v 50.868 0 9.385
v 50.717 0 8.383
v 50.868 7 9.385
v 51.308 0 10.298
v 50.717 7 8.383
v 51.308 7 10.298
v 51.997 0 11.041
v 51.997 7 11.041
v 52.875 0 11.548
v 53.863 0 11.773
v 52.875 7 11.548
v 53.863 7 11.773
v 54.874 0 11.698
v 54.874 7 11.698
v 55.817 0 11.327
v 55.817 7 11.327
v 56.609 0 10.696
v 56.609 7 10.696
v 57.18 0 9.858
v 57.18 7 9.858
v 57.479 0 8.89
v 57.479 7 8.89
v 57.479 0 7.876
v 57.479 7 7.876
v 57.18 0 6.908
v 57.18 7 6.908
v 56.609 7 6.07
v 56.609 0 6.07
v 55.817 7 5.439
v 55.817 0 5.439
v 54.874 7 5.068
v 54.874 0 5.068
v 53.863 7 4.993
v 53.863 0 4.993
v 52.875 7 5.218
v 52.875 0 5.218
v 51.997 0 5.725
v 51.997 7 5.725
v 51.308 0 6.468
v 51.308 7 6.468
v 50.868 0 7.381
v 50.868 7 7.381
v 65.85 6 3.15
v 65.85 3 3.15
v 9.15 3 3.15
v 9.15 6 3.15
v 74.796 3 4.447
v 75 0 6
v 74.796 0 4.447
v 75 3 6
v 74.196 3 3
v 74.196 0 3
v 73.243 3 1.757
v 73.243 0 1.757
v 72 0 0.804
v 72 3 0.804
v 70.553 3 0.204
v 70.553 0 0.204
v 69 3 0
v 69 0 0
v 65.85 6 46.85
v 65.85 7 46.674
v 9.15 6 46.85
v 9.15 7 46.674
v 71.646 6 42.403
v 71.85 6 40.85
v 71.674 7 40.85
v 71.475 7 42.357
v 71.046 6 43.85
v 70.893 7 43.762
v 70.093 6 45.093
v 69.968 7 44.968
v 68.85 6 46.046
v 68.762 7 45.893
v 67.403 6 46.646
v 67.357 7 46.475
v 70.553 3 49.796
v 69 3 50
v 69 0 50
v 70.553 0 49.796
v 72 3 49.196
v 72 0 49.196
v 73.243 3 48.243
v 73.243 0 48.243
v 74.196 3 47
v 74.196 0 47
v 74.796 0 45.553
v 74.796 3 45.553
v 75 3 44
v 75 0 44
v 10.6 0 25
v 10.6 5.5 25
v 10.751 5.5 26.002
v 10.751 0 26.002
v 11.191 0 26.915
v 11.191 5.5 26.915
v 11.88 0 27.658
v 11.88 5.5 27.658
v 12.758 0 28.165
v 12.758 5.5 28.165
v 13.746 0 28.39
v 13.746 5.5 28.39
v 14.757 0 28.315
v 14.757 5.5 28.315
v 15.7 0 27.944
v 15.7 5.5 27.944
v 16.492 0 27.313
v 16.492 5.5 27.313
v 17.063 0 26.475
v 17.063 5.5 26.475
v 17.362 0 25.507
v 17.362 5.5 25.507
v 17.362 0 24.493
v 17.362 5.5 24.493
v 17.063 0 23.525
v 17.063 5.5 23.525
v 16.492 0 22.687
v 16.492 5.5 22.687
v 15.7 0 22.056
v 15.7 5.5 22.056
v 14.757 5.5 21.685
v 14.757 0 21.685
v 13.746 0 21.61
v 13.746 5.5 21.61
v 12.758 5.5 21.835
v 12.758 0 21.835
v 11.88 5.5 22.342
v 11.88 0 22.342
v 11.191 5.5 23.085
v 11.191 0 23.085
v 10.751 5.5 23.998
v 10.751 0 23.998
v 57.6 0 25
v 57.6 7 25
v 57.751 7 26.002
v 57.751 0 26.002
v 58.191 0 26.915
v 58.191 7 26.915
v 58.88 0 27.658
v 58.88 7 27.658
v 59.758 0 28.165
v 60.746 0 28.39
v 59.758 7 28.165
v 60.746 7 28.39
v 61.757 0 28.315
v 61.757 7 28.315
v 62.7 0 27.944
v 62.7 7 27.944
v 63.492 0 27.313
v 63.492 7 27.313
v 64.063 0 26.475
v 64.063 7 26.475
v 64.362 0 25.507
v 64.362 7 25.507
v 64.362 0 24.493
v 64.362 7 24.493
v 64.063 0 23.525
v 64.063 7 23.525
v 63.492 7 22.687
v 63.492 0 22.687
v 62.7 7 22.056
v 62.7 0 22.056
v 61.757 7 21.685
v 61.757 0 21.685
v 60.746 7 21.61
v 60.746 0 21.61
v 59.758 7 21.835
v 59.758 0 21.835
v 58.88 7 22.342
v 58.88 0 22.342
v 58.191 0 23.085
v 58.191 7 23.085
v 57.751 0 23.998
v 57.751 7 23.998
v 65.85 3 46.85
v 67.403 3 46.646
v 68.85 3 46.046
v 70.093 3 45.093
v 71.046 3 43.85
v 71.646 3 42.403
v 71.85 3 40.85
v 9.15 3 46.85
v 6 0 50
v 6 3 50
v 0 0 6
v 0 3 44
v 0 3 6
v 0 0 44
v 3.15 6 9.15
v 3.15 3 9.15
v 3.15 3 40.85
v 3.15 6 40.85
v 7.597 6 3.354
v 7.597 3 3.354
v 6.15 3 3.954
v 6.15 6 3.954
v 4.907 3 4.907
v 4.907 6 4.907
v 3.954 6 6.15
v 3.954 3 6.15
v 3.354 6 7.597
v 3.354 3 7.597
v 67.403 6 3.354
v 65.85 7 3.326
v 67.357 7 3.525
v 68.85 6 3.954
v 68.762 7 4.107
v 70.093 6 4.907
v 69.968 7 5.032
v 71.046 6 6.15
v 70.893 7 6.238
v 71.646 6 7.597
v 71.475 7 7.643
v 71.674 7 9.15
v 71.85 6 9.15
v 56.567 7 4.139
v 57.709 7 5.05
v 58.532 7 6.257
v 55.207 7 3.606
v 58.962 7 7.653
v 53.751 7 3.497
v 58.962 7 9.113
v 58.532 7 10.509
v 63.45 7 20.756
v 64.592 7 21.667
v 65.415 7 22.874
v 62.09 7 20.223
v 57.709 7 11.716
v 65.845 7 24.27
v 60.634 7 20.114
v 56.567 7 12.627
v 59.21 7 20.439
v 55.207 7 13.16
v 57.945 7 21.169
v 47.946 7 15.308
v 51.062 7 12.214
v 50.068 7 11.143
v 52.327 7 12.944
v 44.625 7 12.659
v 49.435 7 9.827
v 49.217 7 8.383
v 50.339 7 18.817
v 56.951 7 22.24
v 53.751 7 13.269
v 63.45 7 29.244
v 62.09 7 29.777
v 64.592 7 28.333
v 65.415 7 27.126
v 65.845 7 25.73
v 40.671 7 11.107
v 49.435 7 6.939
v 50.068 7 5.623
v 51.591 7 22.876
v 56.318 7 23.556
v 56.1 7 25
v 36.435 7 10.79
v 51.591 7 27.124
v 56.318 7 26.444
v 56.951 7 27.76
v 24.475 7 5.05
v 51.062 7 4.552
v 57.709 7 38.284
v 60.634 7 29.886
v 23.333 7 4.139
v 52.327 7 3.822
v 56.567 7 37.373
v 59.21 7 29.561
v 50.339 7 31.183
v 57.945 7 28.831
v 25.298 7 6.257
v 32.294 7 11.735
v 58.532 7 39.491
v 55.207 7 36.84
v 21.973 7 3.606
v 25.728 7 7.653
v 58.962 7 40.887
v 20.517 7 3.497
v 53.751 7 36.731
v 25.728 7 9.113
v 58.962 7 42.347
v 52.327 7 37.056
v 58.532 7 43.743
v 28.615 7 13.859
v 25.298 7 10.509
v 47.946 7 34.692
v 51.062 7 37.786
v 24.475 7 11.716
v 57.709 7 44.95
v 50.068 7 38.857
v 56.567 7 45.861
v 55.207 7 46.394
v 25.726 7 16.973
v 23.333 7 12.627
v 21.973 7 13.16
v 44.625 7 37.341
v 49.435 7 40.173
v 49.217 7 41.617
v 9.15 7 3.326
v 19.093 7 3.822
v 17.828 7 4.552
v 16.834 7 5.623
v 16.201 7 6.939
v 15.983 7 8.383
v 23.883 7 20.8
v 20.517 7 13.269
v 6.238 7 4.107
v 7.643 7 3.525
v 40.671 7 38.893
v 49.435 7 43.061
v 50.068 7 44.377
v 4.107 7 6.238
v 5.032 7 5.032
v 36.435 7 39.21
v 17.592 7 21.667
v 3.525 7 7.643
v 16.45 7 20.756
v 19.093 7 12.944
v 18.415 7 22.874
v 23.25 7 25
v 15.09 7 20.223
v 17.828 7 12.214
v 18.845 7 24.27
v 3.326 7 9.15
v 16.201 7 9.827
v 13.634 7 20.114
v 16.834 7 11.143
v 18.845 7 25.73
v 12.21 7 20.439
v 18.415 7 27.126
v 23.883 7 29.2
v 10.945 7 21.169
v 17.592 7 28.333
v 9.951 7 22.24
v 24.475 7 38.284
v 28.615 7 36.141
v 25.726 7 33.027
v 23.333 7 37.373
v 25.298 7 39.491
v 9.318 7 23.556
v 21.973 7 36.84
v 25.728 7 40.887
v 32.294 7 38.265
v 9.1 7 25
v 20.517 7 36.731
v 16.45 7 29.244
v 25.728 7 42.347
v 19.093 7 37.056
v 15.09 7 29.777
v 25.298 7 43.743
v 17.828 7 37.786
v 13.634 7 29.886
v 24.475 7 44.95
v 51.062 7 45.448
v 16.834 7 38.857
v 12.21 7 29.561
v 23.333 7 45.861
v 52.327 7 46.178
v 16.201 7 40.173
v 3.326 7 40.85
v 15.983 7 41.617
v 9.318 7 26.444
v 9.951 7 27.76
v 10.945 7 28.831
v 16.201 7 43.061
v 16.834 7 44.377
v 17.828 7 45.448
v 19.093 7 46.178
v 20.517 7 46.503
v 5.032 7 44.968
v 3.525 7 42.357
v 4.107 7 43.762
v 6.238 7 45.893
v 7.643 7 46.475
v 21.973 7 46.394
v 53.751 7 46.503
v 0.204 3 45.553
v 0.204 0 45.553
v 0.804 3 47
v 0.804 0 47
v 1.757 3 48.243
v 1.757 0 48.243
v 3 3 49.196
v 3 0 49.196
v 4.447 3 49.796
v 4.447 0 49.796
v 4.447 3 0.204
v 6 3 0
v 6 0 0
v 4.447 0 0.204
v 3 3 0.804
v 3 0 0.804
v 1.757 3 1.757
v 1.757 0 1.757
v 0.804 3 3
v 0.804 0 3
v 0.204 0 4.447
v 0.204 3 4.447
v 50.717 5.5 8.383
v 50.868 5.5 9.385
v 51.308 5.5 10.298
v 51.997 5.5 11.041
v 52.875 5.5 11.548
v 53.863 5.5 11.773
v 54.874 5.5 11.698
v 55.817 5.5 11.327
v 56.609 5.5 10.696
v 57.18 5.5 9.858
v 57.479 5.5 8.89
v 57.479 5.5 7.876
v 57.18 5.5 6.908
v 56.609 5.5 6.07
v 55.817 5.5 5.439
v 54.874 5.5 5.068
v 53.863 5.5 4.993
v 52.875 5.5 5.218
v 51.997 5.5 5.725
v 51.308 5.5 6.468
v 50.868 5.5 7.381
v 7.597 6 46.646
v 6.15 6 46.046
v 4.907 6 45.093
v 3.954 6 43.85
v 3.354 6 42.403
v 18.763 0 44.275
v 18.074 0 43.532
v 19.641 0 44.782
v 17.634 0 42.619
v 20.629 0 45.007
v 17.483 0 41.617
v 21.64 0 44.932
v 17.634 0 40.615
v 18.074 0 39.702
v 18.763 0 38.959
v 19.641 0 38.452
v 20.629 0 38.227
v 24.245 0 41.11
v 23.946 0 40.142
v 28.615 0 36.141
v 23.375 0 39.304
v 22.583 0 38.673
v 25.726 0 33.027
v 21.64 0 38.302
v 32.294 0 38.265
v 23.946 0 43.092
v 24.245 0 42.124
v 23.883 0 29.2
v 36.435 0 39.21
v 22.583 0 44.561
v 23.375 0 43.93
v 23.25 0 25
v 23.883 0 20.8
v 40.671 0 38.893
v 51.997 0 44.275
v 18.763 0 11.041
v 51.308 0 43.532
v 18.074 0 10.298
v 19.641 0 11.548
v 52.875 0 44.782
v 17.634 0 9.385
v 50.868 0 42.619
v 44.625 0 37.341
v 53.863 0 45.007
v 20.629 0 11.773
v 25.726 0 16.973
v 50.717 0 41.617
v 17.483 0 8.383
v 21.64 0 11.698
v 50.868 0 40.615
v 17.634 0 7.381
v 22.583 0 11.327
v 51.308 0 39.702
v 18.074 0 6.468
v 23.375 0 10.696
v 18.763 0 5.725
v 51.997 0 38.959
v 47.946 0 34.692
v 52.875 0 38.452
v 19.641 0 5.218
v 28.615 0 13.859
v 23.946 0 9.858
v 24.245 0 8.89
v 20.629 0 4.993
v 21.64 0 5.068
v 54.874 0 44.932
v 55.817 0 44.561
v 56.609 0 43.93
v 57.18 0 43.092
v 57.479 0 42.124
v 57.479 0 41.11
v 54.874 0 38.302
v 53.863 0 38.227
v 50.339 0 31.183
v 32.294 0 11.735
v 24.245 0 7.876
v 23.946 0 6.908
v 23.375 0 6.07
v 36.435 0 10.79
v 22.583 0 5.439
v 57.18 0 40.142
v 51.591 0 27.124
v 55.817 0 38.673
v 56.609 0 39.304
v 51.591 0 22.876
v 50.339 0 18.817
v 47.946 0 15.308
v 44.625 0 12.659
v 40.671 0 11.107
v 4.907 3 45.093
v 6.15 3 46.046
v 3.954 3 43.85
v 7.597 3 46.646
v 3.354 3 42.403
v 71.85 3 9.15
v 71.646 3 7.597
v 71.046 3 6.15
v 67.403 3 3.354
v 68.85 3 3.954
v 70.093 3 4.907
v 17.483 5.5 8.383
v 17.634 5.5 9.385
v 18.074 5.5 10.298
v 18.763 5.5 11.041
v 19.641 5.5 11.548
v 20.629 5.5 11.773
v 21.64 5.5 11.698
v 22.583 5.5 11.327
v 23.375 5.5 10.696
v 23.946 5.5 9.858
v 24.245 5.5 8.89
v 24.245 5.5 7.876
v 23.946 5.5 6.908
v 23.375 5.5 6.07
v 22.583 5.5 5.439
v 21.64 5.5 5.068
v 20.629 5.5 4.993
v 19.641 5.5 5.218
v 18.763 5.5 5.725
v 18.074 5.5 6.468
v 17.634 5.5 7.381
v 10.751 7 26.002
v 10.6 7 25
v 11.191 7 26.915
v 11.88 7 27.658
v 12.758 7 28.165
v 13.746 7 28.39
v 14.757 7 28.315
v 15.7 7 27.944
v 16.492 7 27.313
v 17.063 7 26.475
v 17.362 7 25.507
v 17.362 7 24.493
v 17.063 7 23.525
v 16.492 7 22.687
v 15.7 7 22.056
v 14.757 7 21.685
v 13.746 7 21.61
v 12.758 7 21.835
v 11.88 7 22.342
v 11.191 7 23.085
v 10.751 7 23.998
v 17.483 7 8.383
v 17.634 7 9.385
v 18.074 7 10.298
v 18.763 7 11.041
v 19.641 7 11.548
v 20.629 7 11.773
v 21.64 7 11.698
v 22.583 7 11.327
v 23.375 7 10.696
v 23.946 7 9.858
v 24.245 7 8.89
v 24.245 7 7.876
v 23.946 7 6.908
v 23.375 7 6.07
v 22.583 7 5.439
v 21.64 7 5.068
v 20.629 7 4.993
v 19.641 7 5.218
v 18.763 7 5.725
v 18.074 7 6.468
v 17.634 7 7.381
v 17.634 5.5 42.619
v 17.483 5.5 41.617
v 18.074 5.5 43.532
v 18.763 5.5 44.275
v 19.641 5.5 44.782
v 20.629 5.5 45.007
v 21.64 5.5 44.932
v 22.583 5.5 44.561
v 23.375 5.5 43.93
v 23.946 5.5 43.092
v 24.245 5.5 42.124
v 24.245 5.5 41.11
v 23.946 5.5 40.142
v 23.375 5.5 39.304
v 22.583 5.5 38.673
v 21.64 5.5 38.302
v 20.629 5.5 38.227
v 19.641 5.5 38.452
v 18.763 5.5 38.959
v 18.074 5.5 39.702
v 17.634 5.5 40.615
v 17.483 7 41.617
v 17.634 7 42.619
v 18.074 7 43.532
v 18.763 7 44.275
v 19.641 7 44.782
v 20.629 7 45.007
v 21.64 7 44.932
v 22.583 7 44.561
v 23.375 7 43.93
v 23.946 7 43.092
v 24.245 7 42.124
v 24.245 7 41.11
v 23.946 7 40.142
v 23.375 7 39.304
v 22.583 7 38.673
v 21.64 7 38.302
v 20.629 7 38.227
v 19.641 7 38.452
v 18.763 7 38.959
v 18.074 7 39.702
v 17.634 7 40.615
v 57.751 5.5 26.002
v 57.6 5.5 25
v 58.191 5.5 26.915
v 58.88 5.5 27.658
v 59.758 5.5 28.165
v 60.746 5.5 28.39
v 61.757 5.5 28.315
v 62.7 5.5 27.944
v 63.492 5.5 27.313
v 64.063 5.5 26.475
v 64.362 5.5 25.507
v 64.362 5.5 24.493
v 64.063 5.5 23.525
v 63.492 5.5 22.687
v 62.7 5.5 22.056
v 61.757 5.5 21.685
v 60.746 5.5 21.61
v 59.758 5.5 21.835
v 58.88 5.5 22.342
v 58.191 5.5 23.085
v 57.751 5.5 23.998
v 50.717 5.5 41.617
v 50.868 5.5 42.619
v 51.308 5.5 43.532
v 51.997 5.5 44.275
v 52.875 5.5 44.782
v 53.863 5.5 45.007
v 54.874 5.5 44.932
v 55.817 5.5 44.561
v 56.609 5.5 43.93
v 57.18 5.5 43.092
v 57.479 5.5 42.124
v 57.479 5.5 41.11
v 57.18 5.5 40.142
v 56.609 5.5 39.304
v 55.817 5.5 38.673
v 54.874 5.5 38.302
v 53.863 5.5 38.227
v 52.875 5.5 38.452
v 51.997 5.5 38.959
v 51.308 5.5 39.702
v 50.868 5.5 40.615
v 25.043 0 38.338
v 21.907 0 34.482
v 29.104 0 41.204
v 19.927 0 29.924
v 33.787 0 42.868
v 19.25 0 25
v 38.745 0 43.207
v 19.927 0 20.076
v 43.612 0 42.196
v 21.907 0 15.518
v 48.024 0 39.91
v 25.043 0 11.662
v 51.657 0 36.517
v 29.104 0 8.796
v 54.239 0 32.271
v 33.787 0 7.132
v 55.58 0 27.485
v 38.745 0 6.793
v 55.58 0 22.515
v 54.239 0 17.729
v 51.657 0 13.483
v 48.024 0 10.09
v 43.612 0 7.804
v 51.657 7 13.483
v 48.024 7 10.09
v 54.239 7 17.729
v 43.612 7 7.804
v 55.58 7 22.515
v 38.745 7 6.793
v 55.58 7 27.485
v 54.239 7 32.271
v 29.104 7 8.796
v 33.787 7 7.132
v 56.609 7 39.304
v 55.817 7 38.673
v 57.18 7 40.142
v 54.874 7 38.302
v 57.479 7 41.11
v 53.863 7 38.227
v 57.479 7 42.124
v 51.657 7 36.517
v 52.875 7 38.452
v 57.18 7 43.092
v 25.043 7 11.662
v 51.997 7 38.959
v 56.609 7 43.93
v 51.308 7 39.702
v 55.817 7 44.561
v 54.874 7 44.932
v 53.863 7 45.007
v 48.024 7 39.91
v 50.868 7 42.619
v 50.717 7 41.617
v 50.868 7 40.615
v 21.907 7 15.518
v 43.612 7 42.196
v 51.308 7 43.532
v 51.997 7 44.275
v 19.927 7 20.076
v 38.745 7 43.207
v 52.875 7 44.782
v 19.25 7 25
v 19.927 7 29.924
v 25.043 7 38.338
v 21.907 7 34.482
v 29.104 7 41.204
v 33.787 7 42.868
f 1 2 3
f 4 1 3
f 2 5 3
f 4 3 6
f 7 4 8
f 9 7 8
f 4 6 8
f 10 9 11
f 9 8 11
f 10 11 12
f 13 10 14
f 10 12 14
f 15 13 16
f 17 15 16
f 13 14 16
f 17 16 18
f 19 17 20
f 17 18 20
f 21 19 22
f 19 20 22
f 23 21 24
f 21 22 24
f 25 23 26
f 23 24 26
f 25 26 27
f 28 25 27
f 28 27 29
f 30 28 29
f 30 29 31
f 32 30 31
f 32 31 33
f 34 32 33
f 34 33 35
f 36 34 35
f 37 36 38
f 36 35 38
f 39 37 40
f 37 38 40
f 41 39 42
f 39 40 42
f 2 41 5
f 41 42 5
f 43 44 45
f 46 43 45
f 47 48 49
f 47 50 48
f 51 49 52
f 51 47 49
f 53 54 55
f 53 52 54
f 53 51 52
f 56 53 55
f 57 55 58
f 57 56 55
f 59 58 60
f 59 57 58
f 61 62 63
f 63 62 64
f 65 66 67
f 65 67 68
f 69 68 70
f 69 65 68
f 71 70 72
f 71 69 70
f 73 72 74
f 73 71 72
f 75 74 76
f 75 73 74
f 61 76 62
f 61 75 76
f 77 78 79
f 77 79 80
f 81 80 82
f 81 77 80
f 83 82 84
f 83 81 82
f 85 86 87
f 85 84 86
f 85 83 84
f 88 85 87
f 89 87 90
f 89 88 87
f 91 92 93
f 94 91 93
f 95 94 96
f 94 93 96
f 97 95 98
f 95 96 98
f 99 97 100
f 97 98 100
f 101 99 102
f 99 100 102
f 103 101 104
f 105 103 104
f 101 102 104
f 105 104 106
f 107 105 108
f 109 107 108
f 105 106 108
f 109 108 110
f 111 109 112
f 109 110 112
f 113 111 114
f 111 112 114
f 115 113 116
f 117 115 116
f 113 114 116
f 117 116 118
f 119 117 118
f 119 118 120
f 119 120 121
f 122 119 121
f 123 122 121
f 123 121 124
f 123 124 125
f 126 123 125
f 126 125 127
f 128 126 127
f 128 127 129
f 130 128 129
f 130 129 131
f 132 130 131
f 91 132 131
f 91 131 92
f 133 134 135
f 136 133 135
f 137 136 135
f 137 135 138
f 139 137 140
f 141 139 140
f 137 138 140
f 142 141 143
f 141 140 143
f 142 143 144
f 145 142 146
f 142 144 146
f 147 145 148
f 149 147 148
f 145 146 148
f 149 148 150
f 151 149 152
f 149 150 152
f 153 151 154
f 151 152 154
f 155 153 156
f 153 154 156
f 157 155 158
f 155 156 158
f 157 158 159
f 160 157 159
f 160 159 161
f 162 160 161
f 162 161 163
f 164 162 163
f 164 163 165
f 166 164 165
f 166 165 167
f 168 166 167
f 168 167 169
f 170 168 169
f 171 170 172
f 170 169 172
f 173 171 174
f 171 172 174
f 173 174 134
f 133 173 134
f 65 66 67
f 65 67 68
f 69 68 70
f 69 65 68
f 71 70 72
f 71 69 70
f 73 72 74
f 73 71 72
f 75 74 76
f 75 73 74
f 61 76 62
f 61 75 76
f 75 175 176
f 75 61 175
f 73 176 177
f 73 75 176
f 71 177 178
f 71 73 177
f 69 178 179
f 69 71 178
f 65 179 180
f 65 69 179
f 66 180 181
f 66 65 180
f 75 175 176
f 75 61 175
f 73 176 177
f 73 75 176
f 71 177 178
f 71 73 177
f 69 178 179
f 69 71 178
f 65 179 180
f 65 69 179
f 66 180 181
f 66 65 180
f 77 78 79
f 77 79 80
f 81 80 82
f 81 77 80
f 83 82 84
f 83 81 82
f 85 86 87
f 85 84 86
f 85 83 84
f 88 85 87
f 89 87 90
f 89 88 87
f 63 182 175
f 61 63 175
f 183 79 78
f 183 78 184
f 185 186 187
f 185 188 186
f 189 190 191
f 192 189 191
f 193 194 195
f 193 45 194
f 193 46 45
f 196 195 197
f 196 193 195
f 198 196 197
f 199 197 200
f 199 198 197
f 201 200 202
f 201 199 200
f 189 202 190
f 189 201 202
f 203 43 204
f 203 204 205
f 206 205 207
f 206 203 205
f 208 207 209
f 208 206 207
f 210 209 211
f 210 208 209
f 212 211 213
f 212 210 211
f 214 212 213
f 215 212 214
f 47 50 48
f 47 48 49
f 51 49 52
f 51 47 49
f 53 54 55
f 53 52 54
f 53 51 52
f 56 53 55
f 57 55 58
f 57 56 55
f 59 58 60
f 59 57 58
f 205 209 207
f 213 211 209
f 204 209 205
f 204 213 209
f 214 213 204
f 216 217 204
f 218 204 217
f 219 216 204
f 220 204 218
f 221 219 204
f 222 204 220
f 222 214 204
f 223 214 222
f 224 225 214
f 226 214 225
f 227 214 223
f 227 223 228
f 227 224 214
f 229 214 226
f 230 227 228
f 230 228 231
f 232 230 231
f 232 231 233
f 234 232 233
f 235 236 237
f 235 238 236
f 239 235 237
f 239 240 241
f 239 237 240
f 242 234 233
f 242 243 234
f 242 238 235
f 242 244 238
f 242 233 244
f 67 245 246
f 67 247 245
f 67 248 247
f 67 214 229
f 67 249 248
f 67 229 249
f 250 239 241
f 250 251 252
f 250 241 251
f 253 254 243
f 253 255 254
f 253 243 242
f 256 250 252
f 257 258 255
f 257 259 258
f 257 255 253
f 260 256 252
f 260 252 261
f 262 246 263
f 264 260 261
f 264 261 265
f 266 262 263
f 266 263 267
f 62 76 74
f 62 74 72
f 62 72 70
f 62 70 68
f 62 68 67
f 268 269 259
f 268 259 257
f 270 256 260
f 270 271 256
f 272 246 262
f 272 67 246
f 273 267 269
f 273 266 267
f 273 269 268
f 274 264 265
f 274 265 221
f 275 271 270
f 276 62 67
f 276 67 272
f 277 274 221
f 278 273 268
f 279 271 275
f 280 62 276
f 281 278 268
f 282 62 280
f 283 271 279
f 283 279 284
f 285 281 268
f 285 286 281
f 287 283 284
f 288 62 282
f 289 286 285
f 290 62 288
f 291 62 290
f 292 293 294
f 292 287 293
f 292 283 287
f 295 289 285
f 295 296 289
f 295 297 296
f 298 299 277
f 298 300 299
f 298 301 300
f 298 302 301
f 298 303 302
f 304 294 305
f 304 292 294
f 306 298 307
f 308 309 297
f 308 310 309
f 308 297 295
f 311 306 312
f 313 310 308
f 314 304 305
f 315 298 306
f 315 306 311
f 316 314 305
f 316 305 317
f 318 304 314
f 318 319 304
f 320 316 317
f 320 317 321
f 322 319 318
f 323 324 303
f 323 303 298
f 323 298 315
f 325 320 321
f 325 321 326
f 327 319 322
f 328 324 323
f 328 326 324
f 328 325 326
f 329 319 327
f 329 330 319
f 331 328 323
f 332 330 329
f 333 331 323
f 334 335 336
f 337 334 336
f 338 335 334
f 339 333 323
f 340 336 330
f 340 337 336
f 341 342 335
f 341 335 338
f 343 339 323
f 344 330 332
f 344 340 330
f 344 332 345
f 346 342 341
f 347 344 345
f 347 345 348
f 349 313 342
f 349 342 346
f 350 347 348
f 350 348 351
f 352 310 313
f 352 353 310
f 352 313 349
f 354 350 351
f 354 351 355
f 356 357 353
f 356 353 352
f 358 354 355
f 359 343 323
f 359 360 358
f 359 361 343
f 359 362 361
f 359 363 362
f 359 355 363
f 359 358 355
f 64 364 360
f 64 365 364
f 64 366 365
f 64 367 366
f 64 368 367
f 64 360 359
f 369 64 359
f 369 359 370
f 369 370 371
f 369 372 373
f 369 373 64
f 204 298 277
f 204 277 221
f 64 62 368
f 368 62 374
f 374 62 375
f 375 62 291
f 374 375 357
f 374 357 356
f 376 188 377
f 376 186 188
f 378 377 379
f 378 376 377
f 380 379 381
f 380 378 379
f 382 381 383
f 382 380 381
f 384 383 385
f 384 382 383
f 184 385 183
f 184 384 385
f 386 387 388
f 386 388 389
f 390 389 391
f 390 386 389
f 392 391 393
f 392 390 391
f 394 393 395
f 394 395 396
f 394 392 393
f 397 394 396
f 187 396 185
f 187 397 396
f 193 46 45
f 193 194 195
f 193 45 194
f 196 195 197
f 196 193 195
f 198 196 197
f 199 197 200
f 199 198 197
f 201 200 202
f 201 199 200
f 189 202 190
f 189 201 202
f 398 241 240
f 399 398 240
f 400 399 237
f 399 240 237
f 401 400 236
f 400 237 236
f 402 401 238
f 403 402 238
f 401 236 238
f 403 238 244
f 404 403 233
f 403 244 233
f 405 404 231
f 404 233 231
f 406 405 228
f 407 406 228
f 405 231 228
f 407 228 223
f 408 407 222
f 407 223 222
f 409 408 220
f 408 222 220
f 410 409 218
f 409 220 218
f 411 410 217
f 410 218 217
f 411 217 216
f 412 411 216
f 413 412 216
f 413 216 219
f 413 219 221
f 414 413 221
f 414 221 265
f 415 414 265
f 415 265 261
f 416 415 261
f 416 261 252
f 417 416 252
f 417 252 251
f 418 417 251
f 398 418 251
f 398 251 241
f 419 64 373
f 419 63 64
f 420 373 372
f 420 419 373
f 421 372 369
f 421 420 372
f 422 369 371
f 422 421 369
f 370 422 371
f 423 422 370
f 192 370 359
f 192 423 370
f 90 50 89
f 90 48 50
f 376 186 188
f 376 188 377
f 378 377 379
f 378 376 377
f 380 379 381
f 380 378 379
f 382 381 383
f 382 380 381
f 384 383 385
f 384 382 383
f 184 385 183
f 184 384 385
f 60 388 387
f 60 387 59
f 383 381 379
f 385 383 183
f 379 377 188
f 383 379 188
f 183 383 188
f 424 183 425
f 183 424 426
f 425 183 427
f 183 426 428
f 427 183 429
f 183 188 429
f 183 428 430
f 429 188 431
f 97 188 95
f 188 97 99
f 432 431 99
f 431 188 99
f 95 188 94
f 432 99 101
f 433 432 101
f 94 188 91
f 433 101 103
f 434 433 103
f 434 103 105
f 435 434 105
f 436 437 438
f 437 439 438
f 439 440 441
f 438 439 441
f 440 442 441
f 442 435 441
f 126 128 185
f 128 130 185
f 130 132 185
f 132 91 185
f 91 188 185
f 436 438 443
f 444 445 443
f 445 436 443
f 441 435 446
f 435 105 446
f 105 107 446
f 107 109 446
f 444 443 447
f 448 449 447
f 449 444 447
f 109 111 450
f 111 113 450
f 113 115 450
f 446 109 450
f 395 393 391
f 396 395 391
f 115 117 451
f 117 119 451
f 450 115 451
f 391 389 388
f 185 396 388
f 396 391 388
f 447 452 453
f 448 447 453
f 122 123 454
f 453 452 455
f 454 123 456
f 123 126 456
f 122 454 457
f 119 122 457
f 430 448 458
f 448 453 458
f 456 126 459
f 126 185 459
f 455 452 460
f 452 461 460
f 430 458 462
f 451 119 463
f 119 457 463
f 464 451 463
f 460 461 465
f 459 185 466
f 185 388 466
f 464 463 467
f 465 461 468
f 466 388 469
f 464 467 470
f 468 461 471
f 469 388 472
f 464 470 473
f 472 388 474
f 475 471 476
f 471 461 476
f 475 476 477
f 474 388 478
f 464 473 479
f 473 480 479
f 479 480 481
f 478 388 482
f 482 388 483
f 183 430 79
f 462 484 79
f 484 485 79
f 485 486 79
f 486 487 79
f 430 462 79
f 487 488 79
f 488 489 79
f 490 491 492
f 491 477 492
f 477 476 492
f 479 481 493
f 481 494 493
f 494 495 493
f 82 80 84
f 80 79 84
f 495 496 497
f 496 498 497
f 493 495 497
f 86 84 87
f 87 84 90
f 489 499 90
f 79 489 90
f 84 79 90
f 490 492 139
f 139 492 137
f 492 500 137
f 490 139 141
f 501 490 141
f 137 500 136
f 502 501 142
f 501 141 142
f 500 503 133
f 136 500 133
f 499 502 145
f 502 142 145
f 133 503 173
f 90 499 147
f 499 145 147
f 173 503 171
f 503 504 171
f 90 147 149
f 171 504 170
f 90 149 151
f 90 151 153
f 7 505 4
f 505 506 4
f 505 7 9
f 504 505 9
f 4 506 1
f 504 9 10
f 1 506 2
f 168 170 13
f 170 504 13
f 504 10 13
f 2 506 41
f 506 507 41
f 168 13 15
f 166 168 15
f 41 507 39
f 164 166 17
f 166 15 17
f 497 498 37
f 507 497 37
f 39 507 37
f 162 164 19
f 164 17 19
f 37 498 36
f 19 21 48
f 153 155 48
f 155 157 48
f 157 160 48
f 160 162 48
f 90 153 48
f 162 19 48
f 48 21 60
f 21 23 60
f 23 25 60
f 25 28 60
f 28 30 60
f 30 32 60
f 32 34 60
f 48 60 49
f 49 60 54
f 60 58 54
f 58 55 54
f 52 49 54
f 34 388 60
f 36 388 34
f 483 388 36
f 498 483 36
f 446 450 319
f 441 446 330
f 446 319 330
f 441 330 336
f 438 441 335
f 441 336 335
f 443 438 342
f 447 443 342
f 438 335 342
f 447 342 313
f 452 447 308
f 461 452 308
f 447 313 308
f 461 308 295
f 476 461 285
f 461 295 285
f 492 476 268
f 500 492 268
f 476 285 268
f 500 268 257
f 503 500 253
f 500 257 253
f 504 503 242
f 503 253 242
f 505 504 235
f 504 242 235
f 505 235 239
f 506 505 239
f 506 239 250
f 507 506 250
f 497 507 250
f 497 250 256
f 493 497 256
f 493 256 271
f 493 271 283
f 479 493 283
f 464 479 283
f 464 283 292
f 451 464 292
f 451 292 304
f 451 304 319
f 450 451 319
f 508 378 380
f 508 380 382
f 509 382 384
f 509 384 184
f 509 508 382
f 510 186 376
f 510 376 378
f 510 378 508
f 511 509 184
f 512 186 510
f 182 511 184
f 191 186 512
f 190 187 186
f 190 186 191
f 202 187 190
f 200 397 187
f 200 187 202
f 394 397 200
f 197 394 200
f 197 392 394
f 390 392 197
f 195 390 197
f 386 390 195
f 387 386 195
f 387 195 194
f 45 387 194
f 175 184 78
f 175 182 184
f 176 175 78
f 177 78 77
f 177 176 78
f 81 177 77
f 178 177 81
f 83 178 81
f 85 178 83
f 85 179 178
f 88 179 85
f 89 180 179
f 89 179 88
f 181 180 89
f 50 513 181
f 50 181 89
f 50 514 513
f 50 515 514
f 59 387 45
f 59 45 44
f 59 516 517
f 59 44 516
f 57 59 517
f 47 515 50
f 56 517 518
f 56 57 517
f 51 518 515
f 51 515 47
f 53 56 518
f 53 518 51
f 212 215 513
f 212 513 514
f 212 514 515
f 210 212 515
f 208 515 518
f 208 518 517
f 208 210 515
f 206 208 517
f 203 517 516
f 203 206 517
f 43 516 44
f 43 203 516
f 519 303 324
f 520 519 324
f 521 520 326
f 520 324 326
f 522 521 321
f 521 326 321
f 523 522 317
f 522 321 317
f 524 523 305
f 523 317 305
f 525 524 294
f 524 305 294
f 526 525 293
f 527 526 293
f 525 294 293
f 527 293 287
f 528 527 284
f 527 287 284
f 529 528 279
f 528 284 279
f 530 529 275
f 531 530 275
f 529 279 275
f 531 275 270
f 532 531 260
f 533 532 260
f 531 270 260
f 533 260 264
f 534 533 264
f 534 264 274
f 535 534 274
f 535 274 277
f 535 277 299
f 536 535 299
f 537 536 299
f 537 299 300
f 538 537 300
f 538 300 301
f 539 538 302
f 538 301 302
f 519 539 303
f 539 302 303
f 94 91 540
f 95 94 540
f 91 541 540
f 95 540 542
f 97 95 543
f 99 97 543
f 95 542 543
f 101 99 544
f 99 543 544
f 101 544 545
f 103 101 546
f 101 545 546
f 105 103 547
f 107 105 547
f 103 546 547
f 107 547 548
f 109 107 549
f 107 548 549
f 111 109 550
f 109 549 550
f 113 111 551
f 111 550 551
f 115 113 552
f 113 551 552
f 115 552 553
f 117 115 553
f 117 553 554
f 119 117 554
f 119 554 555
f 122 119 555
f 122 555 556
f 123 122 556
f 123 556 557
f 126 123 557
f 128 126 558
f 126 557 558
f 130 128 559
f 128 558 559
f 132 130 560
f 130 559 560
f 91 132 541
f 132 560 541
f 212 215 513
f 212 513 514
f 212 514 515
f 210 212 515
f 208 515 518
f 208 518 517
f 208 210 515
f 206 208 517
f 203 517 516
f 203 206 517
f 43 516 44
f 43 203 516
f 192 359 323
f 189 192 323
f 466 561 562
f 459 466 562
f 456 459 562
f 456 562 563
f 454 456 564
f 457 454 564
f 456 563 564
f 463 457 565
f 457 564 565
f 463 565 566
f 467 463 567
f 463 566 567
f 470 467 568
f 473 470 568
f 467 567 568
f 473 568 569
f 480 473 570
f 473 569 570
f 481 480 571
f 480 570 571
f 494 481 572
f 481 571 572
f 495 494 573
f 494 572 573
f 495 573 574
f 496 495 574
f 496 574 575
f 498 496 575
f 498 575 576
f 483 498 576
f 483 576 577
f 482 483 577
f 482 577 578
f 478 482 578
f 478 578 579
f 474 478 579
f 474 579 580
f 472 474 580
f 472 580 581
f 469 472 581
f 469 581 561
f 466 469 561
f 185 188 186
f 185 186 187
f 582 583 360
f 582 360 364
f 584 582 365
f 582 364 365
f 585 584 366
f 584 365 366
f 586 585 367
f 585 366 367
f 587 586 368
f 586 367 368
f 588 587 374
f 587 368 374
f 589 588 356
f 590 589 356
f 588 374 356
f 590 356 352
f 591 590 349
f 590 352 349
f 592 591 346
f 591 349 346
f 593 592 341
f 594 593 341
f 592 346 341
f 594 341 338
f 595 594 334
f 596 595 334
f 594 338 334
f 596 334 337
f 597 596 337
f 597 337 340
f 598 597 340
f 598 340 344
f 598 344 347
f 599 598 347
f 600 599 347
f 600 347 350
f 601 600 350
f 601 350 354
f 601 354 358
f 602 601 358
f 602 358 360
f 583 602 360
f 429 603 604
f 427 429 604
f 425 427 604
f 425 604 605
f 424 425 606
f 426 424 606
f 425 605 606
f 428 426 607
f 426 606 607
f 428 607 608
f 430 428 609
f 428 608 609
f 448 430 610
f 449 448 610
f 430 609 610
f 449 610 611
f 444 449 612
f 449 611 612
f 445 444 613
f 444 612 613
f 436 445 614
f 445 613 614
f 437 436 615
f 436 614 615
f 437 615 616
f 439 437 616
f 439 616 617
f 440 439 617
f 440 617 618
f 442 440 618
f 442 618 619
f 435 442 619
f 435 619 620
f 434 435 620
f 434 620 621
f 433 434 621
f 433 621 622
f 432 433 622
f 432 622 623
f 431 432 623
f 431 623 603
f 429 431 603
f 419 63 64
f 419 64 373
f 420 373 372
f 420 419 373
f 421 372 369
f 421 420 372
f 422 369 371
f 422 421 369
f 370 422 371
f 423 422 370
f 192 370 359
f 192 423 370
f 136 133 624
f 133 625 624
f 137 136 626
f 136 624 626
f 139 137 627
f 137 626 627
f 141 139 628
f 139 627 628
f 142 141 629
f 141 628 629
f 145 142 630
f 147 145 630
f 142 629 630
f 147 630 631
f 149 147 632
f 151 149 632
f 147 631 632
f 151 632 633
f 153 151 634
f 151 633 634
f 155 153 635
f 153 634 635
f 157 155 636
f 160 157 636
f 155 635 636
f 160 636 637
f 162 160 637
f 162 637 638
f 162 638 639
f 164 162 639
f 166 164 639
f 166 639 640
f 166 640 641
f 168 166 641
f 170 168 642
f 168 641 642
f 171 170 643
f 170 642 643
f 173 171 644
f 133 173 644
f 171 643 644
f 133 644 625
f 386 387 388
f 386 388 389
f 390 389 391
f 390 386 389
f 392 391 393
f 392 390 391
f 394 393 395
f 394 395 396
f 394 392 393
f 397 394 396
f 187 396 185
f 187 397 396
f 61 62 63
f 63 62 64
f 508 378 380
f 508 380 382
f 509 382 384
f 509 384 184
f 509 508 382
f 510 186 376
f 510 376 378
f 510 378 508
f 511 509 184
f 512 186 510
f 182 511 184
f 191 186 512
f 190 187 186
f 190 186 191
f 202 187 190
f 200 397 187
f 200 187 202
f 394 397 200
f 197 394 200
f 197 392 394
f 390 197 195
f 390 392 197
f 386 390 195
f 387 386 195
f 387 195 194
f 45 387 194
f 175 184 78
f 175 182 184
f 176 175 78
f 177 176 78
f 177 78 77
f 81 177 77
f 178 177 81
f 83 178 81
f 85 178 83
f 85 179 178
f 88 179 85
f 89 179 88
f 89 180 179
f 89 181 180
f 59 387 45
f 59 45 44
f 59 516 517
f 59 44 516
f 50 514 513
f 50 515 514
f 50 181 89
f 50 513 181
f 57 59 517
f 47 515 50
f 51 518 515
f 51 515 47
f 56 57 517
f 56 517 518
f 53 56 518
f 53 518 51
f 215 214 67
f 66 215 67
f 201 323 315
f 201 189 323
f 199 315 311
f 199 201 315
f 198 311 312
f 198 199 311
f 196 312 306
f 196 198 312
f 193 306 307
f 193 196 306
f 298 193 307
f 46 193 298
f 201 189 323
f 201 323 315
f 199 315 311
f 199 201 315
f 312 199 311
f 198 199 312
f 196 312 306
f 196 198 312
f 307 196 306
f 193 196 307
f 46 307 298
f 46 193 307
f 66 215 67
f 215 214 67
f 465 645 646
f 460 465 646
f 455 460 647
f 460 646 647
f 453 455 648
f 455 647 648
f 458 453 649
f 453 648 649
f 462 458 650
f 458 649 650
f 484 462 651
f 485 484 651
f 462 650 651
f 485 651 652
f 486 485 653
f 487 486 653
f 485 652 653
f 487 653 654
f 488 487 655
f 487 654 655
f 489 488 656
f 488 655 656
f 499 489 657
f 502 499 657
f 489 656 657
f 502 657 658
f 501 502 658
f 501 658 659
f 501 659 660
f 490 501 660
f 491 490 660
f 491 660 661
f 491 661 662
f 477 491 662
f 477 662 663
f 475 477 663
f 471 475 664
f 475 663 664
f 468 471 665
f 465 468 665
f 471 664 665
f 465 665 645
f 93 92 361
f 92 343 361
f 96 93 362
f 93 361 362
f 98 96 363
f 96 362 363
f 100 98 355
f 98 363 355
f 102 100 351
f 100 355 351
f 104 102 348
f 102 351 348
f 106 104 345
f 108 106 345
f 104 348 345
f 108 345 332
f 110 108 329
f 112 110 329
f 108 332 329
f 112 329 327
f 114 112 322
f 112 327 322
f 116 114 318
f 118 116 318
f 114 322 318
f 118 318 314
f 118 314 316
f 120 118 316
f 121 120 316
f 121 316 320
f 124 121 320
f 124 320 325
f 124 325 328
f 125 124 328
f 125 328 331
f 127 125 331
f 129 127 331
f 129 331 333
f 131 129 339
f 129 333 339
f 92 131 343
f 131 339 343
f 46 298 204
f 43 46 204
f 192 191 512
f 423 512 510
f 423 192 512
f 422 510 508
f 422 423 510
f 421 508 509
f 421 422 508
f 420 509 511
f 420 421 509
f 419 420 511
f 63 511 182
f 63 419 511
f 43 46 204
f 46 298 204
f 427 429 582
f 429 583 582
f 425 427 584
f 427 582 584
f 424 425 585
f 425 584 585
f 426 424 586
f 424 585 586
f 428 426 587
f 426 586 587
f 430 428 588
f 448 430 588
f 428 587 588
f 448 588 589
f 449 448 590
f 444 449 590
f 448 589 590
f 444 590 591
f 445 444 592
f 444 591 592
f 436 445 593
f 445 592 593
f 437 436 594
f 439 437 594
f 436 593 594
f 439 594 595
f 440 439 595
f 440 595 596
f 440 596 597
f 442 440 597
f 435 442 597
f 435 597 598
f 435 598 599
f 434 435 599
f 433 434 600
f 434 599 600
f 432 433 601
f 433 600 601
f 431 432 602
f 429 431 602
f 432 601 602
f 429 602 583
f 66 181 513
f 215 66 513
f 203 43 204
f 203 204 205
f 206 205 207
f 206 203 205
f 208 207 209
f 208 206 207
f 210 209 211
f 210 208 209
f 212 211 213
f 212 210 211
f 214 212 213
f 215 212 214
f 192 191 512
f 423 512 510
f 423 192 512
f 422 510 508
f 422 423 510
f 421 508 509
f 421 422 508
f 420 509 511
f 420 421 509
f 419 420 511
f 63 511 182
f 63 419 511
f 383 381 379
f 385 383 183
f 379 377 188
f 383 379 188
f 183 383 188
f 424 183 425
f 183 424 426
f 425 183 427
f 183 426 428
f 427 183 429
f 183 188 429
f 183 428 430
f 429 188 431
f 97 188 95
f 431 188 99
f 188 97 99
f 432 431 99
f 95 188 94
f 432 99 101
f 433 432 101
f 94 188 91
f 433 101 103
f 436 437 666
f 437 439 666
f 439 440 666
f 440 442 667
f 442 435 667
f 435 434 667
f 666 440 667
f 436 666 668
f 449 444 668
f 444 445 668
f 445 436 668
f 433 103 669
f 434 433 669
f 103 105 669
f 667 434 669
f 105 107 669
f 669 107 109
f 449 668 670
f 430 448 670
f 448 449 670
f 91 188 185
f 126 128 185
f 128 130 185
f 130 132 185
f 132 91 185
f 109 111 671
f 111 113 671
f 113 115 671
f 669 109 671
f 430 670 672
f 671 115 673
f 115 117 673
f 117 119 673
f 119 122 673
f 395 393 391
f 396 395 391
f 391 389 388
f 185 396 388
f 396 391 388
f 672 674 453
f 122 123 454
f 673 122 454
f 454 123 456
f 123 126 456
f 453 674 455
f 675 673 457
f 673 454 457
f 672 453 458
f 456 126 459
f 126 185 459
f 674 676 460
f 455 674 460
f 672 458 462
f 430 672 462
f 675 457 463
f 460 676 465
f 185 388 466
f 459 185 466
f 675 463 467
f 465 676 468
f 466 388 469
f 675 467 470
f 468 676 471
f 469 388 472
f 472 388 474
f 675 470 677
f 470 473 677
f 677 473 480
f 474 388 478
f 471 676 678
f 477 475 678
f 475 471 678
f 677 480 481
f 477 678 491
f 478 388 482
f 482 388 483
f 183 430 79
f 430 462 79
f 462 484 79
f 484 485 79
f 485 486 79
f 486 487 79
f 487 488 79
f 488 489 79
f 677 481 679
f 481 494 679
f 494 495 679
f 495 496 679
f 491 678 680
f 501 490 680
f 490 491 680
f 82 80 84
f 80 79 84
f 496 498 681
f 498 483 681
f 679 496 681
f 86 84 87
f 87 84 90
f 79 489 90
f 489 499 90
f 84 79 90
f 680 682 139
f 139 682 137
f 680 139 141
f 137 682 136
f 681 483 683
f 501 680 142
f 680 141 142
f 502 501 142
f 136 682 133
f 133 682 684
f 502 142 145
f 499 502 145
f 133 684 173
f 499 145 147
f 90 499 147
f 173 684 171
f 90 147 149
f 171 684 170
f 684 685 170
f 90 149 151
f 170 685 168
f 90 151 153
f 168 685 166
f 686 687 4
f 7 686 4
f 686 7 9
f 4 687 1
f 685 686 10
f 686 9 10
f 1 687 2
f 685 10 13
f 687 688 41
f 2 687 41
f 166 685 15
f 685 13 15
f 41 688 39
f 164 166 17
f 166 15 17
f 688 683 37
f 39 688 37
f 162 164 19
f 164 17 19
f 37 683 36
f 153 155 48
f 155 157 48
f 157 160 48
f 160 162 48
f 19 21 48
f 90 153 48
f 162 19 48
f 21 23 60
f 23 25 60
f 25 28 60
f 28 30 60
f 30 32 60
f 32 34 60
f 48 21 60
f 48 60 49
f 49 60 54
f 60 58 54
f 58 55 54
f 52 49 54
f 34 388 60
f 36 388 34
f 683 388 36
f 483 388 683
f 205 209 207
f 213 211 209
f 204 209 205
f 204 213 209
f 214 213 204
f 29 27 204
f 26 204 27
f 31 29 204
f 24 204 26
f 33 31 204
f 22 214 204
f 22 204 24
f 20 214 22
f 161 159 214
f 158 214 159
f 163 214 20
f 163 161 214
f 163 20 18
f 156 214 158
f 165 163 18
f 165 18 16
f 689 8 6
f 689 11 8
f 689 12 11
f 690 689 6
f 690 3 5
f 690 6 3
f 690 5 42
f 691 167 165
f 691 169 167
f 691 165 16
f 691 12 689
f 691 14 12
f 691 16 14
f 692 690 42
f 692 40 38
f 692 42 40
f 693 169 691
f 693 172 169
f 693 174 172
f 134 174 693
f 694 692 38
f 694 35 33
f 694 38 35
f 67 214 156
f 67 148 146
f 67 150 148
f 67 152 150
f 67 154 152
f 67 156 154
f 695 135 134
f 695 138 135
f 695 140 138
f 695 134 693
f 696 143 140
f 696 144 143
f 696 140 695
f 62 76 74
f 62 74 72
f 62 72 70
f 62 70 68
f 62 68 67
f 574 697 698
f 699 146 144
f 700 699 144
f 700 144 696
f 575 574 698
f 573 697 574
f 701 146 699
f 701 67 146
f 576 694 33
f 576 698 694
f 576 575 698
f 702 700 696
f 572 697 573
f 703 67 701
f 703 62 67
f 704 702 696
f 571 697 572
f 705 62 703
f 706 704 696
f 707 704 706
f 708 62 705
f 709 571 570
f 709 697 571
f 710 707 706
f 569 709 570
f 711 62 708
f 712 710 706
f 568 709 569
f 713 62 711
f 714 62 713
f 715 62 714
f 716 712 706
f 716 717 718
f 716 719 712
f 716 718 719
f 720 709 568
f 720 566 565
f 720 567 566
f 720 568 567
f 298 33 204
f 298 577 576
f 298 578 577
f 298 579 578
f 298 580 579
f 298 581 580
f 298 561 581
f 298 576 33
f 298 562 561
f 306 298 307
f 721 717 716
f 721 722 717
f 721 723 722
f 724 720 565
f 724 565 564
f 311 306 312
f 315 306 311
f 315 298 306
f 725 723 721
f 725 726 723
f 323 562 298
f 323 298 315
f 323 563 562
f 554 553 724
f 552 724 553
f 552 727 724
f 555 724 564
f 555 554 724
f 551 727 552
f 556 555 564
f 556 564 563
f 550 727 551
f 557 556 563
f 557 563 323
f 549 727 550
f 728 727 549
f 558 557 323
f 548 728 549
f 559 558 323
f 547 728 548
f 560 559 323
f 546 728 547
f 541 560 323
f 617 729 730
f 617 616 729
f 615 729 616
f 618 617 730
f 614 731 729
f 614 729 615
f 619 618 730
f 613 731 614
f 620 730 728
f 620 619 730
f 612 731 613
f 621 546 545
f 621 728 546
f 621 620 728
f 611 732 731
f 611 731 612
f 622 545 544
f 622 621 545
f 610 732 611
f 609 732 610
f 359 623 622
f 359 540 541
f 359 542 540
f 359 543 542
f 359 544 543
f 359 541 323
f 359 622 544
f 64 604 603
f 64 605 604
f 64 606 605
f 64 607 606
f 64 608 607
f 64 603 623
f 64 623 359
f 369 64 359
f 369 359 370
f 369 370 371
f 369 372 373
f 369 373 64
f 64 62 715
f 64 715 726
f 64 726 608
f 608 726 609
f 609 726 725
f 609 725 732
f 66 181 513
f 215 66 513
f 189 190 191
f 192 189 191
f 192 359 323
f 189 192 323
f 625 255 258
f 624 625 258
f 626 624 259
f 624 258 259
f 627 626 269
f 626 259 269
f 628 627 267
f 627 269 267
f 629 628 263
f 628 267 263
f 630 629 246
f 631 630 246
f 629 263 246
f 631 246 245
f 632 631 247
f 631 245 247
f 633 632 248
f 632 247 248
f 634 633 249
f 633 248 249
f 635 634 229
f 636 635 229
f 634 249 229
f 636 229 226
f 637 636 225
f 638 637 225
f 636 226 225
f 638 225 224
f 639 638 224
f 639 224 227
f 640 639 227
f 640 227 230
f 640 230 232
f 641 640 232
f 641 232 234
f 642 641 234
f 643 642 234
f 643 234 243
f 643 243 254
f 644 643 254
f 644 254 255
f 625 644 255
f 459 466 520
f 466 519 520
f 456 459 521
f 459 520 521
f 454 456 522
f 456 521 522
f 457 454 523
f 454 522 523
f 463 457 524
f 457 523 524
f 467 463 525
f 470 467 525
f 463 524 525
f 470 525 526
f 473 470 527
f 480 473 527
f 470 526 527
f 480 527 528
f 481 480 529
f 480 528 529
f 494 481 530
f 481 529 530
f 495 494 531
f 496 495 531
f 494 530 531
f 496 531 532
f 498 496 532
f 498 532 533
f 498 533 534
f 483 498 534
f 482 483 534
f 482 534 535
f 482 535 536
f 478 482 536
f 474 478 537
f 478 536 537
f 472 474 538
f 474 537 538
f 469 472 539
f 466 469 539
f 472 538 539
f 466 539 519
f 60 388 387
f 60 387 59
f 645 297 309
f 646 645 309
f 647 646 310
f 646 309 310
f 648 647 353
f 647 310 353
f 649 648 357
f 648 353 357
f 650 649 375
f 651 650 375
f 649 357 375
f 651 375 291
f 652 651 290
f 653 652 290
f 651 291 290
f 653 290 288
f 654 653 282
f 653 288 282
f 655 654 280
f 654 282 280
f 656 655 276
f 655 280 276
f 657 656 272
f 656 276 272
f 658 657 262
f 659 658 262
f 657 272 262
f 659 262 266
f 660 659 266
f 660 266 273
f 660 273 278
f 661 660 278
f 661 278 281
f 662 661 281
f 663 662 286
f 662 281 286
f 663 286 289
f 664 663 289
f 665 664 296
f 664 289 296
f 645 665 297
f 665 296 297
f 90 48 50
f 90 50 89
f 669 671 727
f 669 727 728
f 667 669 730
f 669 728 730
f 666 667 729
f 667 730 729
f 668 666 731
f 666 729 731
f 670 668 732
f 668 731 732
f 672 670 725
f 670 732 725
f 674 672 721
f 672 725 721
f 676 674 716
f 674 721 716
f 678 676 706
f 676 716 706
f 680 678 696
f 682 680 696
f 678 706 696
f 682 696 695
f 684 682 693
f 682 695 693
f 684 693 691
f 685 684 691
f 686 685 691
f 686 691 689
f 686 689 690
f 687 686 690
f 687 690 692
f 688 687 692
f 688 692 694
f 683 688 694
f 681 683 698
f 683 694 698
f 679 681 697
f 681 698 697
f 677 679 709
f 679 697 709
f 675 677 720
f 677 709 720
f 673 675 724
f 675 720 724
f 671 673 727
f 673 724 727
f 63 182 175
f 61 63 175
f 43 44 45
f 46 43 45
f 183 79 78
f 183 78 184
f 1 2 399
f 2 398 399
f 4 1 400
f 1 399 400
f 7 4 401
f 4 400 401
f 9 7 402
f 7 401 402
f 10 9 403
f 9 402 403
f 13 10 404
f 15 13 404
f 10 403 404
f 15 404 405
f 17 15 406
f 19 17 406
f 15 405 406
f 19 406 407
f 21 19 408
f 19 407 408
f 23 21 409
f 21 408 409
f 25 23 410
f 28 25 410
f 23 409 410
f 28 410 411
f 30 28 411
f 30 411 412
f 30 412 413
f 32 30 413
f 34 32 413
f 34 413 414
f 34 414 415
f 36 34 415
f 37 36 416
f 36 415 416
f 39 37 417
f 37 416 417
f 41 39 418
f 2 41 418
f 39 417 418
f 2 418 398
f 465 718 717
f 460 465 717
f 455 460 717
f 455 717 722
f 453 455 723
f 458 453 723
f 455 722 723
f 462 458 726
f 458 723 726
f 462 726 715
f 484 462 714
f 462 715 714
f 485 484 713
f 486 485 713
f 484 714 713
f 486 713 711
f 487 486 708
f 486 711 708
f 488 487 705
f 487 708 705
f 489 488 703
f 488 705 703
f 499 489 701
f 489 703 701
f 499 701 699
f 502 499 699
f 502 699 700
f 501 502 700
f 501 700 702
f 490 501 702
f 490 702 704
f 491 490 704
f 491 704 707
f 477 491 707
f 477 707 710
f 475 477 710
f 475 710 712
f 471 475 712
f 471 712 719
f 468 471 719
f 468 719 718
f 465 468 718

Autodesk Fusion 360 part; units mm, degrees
sketch "Sketch1" plane through (0, 0, 0) normal (0, 1, 0) x (1, 0, 0) in component "2010 Ballscrew Plate"
  line L0 (0, 0) -> (75, 0)
  line L1 (75, 0) -> (75, -50)
  line L2 (75, -50) -> (0, -50)
  line L3 (0, -50) -> (0, 0)
  dimension "d5" = 75
  dimension "d6" = 50
extrude "Extrude1" add sketch "Sketch1" along normal blind 3 makes body 1 in component "2010 Ballscrew Plate"
sketch "Sketch2" plane through (0, 3, 0) normal (0, 1, 0) x (-1, 0, 0) in component "2010 Ballscrew Plate"
  line L0 (0, 50) -> (-75, 50)
  line L1 (-75, 50) -> (-75, 0)
  line L2 (-75, 0) -> (0, 0)
  line L3 (0, 0) -> (0, 50)
  line L4 (-75, 50) -> (0, 0) construction
  line L5 (-3.15, 46.85) -> (-71.85, 46.85)
  line L6 (-71.85, 46.85) -> (-71.85, 3.15)
  line L7 (-71.85, 3.15) -> (-3.15, 3.15)
  line L8 (-3.15, 3.15) -> (-3.15, 46.85)
  line L9 (-3.15, 46.85) -> (-71.85, 3.15) construction
  line L10 (-71.85, 46.85) -> (-3.15, 3.15) construction
  point P0 (-37.5, 25)
  dimension "d9" = 68.7
  dimension "d10" = 43.7
extrude "Extrude2" add sketch "Sketch2" along normal blind 4 contours L5 L6 L7 L8 bodies 1 in component "2010 Ballscrew Plate"
sketch "Sketch3" plane through (0, 7, 0) normal (0, 1, 0) x (-1, 0, 0) in component "2010 Ballscrew Plate"
  line L0 (-3.15, 3.15) -> (-3.15, 46.85)
  line L1 (-3.15, 46.85) -> (-71.85, 46.85)
  line L2 (-71.85, 46.85) -> (-71.85, 3.15)
  line L3 (-71.85, 3.15) -> (-3.15, 3.15)
  line L4 (-71.85, 46.85) -> (-3.15, 3.15) construction
  circle A0 centre (-37.5, 25) radius 18.25
  line L5 (-37.5, 25) -> (-14, 25) construction
  line L6 (-37.5, 25) -> (-61, 25) construction
  circle A1 centre (-61, 25) radius 3.4
  circle A2 centre (-14, 25) radius 3.4
  circle A3 centre (-20.883, 41.617) radius 3.4
  circle A4 centre (-54.117, 8.383) radius 3.4
  circle A5 centre (-54.117, 41.617) radius 3.4
  circle A6 centre (-20.883, 8.383) radius 3.4
  circle A7 centre (-61, 25) radius 3.4
  circle A8 centre (-14, 25) radius 3.4
  dimension "d13" = 36.5
  dimension "d14" = 23.5
  dimension "d15" = 23.5
  dimension "d16" = 6.8
  dimension "d17" = 6.8
  dimension "d19" = 180
extrude "Extrude3" cut sketch "Sketch3" against normal through all contours A0 | A1 A7 | A2 A8 | A3 | A4 | A5 | A6 bodies 1 in component "2010 Ballscrew Plate"
fillet "Fillet1" radius 6 8 edges at (71.85, 5, 46.85) (75, 1.5, 50) (0, 1.5, 50) (3.15, 5, 46.85) (3.15, 5, 3.15) (0, 1.5, 0) (75, 1.5, 0) (71.85, 5, 3.15) on bodies 1 in component "2010 Ballscrew Plate"
sketch "Sketch1 (2)" plane through (0, 0, 0) normal (0, 1, 0) x (1, 0, 0) in component "2010 Ballscrew Plate (Chamfered)"
  line L0 (0, 0) -> (75, 0)
  line L1 (75, 0) -> (75, -50)
  line L2 (75, -50) -> (0, -50)
  line L3 (0, -50) -> (0, 0)
  dimension "d5_1" = 75
  dimension "d6_1" = 50
extrude "Extrude1'" add sketch "Sketch1 (2)" along normal blind 3 separate body makes body 2 in component "2010 Ballscrew Plate (Chamfered)"
sketch "Sketch2 (2)" plane through (0, 3, 0) normal (0, 1, 0) x (-1, 0, 0) in component "2010 Ballscrew Plate (Chamfered)"
  line L0 (0, 50) -> (-75, 50)
  line L1 (-75, 50) -> (-75, 0)
  line L2 (-75, 0) -> (0, 0)
  line L3 (0, 0) -> (0, 50)
  line L4 (-75, 50) -> (0, 0) construction
  line L5 (-3.15, 46.85) -> (-71.85, 46.85)
  line L6 (-71.85, 46.85) -> (-71.85, 3.15)
  line L7 (-71.85, 3.15) -> (-3.15, 3.15)
  line L8 (-3.15, 3.15) -> (-3.15, 46.85)
  line L9 (-3.15, 46.85) -> (-71.85, 3.15) construction
  line L10 (-71.85, 46.85) -> (-3.15, 3.15) construction
  point P0 (-37.5, 25)
  dimension "d9_1" = 68.7
  dimension "d10_1" = 43.7
extrude "Extrude2'" add sketch "Sketch2 (2)" along normal blind 4 contours L5 L6 L7 L8 bodies 2 in component "2010 Ballscrew Plate (Chamfered)"
sketch "Sketch3 (2)" plane through (0, 7, 0) normal (0, 1, 0) x (-1, 0, 0) in component "2010 Ballscrew Plate (Chamfered)"
  line L0 (-3.15, 3.15) -> (-3.15, 46.85)
  line L1 (-3.15, 46.85) -> (-71.85, 46.85)
  line L2 (-71.85, 46.85) -> (-71.85, 3.15)
  line L3 (-71.85, 3.15) -> (-3.15, 3.15)
  line L4 (-71.85, 46.85) -> (-3.15, 3.15) construction
  circle A0 centre (-37.5, 25) radius 14.25
  line L5 (-37.5, 25) -> (-14, 25) construction
  line L6 (-37.5, 25) -> (-61, 25) construction
  circle A1 centre (-61, 25) radius 3.4
  circle A2 centre (-14, 25) radius 3.4
  circle A3 centre (-20.883, 41.617) radius 3.4
  circle A4 centre (-54.117, 8.383) radius 3.4
  circle A5 centre (-54.117, 41.617) radius 3.4
  circle A6 centre (-20.883, 8.383) radius 3.4
  circle A7 centre (-61, 25) radius 3.4
  circle A8 centre (-14, 25) radius 3.4
  dimension "d13_1" = 28.5
  dimension "d14_1" = 23.5
  dimension "d15_1" = 23.5
  dimension "d16_1" = 6.8
  dimension "d17_1" = 6.8
  dimension "d19_1" = 180
extrude "Extrude3'" cut sketch "Sketch3 (2)" against normal through all contours A0 | A1 A7 | A2 A8 | A3 | A4 | A5 | A6 bodies 2 in component "2010 Ballscrew Plate (Chamfered)"
fillet "Fillet1'" radius 6 8 edges at (71.85, 5, 46.85) (75, 1.5, 50) (0, 1.5, 50) (3.15, 5, 46.85) (3.15, 5, 3.15) (0, 1.5, 0) (75, 1.5, 0) (71.85, 5, 3.15) on bodies 2 in component "2010 Ballscrew Plate (Chamfered)"
chamfer "Chamfer1" distance 1.5 angle 45 6 edges at (57.2869, 7, 42.8465) (64.1699, 7, 26.2295) (57.2869, 7, 9.6125) (24.0529, 7, 9.6125) (17.1699, 7, 26.2295) (24.0529, 7, 42.8465) on bodies 2 in component "2010 Ballscrew Plate (Chamfered)"
chamfer "Chamfer2" distance 1 angle 10 8 edges at (70.0926, 7, 45.0926) (71.85, 7, 25) (70.0926, 7, 4.9074) (37.5, 7, 3.15) (4.9074, 7, 4.9074) (3.15, 7, 25) (4.9074, 7, 45.0926) (37.5, 7, 46.85) measured on face at (68.85, 4.3333, 46.0462) measured on face at (64.3906, 7, 36.6341) measured on face at (68.85, 5.6667, 3.9538) measured on face at (64.3906, 7, 36.6341) measured on face at (8.8645, 4.3333, 3.1568) measured on face at (64.3906, 7, 36.6341) measured on face at (8.8645, 4.3333, 46.8432) measured on face at (64.3906, 7, 36.6341) on bodies 2 in component "2010 Ballscrew Plate (Chamfered)"
chamfer "Chamfer1'" distance 1 angle 10 8 edges at (70.0926, 7, 45.0926) (71.85, 7, 25) (70.0926, 7, 4.9074) (37.5, 7, 3.15) (4.9074, 7, 4.9074) (3.15, 7, 25) (4.9074, 7, 45.0926) (37.5, 7, 46.85) measured on face at (68.85, 4.3333, 46.0462) measured on face at (63.7575, 7, 36.3856) measured on face at (68.85, 5.6667, 3.9538) measured on face at (63.7575, 7, 36.3856) measured on face at (8.8645, 4.3333, 3.1568) measured on face at (63.7575, 7, 36.3856) measured on face at (8.8645, 4.3333, 46.8432) measured on face at (63.7575, 7, 36.3856) on bodies 1 in component "2010 Ballscrew Plate"
component "2010 Ballscrew Plate" placed x (1, 0, 0) y (0, 1, 0) z (0, 0, 1) at (0, 0, 0)
component "2010 Ballscrew Plate (Chamfered)" placed x (1, 0, 0) y (0, 1, 0) z (0, 0, 1) at (0, 0, 0)
equation "extrusionTall = 75 mm"
equation "extrusionNarrow = 50 mm"
equation "extrusionRadius = 6 mm"
equation "extrusionThickness = 3 mm"
equation "d5 = extrusionTall"
equation "d6 = extrusionNarrow"
equation "d9 = extrusionTall - ( 2 * extrusionThickness ) - 0.3 mm"
equation "d10 = extrusionNarrow - ( 2 * extrusionThickness ) - 0.3 mm"
equation "d14 = ( 47 / 2 ) * 1 mm"
equation "d15 = ( 47 / 2 ) * 1 mm"
equation "d22 = extrusionRadius"
equation "d5_1 = extrusionTall"
equation "d6_1 = extrusionNarrow"
equation "d9_1 = extrusionTall - ( 2 * extrusionThickness ) - 0.3 mm"
equation "d10_1 = extrusionNarrow - ( 2 * extrusionThickness ) - 0.3 mm"
equation "d14_1 = ( 47 / 2 ) * 1 mm"
equation "d15_1 = ( 47 / 2 ) * 1 mm"
equation "d22_1 = extrusionRadius"
